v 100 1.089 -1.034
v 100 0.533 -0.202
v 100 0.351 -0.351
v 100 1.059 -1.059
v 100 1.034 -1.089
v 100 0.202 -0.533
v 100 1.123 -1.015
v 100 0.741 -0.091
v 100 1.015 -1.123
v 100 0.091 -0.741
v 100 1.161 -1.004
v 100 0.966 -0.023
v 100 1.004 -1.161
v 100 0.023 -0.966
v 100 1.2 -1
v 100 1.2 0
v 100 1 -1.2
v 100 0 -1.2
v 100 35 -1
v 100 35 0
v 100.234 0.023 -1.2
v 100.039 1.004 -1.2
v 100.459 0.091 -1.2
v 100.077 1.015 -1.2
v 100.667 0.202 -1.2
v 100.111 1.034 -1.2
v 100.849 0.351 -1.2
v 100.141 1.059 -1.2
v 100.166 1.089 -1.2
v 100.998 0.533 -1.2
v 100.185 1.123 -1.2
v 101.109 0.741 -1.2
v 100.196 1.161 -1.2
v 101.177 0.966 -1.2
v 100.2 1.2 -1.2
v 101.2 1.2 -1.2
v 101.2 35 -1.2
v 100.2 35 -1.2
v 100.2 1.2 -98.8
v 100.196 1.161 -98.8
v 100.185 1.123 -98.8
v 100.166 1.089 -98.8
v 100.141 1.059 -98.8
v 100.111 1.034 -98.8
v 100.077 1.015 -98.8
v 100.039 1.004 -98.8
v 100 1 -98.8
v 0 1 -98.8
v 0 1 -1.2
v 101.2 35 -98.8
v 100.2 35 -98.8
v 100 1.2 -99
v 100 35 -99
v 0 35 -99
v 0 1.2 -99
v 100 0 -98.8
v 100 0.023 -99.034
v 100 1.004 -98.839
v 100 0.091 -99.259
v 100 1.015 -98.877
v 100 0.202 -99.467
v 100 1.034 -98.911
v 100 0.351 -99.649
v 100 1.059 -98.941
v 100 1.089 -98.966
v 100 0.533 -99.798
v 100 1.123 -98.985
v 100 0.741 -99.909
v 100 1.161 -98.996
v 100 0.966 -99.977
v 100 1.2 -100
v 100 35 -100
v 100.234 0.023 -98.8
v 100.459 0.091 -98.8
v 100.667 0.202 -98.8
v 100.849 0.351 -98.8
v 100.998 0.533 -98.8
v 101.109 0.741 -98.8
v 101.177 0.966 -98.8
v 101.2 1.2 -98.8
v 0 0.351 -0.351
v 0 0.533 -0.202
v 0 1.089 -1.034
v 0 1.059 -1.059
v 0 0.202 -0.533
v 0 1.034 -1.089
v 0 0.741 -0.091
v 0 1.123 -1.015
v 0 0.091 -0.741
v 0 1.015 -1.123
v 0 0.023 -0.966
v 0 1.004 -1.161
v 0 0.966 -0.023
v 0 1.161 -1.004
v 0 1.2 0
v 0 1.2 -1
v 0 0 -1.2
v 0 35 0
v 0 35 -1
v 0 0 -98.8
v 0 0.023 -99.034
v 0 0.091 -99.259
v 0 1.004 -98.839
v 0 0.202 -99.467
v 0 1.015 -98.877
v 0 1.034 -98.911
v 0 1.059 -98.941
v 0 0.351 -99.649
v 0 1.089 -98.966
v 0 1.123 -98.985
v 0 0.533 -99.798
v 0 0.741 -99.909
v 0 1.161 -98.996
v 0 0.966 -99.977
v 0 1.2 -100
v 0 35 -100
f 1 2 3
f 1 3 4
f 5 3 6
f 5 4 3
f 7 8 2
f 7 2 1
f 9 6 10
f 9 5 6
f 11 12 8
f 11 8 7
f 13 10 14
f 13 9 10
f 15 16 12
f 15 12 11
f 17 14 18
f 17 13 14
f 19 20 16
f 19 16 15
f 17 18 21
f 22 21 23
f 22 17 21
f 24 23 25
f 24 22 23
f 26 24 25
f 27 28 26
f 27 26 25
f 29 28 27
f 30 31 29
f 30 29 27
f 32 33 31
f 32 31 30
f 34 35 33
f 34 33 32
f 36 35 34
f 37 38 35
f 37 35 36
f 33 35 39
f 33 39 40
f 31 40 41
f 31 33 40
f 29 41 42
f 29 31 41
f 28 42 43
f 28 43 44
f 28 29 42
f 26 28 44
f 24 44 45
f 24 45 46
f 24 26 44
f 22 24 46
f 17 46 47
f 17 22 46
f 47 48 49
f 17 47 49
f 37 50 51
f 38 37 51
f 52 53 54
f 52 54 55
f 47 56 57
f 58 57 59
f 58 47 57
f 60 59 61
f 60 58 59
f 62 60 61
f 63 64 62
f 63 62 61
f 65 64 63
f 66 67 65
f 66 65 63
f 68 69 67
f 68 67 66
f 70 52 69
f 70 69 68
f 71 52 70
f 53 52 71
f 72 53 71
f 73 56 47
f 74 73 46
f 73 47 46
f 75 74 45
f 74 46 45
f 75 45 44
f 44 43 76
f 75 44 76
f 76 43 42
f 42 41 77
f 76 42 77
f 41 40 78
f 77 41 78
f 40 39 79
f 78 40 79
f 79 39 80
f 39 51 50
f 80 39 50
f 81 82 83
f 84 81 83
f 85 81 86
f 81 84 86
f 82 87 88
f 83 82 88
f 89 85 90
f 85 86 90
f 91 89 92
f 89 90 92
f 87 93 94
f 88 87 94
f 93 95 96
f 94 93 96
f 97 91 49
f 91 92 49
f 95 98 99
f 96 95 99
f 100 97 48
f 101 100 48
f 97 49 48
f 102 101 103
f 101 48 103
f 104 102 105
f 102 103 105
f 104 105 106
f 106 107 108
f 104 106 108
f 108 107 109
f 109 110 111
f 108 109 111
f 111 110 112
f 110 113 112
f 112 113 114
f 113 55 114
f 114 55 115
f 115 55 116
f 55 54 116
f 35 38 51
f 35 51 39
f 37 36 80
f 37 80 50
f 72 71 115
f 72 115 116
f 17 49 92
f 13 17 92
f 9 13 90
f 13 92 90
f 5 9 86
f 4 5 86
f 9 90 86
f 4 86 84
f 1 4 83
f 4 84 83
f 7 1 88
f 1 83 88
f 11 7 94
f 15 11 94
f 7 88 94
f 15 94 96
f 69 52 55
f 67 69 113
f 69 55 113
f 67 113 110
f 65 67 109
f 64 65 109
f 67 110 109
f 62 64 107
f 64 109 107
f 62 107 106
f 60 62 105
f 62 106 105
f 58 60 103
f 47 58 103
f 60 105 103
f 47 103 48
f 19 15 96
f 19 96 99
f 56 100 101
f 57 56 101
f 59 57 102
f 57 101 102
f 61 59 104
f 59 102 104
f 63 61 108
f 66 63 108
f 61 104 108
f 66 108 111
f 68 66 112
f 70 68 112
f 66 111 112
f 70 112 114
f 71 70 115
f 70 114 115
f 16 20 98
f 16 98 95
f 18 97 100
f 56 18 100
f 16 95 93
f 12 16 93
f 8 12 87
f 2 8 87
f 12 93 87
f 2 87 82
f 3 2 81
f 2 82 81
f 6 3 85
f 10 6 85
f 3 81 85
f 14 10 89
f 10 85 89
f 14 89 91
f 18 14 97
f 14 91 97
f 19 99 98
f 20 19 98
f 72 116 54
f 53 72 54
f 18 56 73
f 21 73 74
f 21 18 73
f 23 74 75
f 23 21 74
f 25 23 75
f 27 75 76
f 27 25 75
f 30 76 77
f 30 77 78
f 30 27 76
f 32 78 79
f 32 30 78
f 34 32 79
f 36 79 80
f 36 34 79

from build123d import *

# Parameters (mm, degrees)
SM_BASE_FLANGE_1_DEPTH = 100
SM_EDGE_FLANGE_1_DEPTH = 97.6


# Sheet-metal steps are written as plain solids
with BuildPart() as part:
    # Sketch 1 → 基体-法兰1 (new body)
    with BuildSketch(Plane(origin=(0, 0, 0), x_dir=(0, 0, -1), z_dir=(1, 0, 0))):
        with BuildLine():
            Line((0, 35), (0, 1.2))
            ThreePointArc((0, 1.2), (0.351471863, 0.351471863), (1.2, 0))
            Line((1.2, 0), (98.8, 0))
            ThreePointArc((98.8, 0), (99.648528137, 0.351471863), (100, 1.2))
            Line((100, 1.2), (100, 35))
            Line((100, 35), (99, 35))
            Line((99, 35), (99, 1.2))
            ThreePointArc((99, 1.2), (98.941421356, 1.058578644), (98.8, 1))
            Line((98.8, 1), (1.2, 1))
            ThreePointArc((1.2, 1), (1.058578644, 1.058578644), (1, 1.2))
            Line((1, 1.2), (1, 35))
            Line((1, 35), (0, 35))
        make_face()
    extrude(amount=SM_BASE_FLANGE_1_DEPTH)

    # 边线-法兰1 section (across the edge) → 边线-法兰1 (add)
    with BuildSketch(Plane(origin=(100.2, 1, -1.2), x_dir=(-1, 0, 0), z_dir=(0, 0, -1))):
        with BuildLine():
            Line((-1, 0.2), (-1, 34))
            Line((-1, 34), (0, 34))
            Line((0, 34), (0, 0.2))
            ThreePointArc((0, 0.2), (0.058578644, 0.058578644), (0.2, 0))
            Line((0.2, 0), (0.2, -1))
            ThreePointArc((0.2, -1), (-0.648528137, -0.648528137), (-1, 0.2))
        make_face()
    extrude(amount=SM_EDGE_FLANGE_1_DEPTH)


solid = part.part
